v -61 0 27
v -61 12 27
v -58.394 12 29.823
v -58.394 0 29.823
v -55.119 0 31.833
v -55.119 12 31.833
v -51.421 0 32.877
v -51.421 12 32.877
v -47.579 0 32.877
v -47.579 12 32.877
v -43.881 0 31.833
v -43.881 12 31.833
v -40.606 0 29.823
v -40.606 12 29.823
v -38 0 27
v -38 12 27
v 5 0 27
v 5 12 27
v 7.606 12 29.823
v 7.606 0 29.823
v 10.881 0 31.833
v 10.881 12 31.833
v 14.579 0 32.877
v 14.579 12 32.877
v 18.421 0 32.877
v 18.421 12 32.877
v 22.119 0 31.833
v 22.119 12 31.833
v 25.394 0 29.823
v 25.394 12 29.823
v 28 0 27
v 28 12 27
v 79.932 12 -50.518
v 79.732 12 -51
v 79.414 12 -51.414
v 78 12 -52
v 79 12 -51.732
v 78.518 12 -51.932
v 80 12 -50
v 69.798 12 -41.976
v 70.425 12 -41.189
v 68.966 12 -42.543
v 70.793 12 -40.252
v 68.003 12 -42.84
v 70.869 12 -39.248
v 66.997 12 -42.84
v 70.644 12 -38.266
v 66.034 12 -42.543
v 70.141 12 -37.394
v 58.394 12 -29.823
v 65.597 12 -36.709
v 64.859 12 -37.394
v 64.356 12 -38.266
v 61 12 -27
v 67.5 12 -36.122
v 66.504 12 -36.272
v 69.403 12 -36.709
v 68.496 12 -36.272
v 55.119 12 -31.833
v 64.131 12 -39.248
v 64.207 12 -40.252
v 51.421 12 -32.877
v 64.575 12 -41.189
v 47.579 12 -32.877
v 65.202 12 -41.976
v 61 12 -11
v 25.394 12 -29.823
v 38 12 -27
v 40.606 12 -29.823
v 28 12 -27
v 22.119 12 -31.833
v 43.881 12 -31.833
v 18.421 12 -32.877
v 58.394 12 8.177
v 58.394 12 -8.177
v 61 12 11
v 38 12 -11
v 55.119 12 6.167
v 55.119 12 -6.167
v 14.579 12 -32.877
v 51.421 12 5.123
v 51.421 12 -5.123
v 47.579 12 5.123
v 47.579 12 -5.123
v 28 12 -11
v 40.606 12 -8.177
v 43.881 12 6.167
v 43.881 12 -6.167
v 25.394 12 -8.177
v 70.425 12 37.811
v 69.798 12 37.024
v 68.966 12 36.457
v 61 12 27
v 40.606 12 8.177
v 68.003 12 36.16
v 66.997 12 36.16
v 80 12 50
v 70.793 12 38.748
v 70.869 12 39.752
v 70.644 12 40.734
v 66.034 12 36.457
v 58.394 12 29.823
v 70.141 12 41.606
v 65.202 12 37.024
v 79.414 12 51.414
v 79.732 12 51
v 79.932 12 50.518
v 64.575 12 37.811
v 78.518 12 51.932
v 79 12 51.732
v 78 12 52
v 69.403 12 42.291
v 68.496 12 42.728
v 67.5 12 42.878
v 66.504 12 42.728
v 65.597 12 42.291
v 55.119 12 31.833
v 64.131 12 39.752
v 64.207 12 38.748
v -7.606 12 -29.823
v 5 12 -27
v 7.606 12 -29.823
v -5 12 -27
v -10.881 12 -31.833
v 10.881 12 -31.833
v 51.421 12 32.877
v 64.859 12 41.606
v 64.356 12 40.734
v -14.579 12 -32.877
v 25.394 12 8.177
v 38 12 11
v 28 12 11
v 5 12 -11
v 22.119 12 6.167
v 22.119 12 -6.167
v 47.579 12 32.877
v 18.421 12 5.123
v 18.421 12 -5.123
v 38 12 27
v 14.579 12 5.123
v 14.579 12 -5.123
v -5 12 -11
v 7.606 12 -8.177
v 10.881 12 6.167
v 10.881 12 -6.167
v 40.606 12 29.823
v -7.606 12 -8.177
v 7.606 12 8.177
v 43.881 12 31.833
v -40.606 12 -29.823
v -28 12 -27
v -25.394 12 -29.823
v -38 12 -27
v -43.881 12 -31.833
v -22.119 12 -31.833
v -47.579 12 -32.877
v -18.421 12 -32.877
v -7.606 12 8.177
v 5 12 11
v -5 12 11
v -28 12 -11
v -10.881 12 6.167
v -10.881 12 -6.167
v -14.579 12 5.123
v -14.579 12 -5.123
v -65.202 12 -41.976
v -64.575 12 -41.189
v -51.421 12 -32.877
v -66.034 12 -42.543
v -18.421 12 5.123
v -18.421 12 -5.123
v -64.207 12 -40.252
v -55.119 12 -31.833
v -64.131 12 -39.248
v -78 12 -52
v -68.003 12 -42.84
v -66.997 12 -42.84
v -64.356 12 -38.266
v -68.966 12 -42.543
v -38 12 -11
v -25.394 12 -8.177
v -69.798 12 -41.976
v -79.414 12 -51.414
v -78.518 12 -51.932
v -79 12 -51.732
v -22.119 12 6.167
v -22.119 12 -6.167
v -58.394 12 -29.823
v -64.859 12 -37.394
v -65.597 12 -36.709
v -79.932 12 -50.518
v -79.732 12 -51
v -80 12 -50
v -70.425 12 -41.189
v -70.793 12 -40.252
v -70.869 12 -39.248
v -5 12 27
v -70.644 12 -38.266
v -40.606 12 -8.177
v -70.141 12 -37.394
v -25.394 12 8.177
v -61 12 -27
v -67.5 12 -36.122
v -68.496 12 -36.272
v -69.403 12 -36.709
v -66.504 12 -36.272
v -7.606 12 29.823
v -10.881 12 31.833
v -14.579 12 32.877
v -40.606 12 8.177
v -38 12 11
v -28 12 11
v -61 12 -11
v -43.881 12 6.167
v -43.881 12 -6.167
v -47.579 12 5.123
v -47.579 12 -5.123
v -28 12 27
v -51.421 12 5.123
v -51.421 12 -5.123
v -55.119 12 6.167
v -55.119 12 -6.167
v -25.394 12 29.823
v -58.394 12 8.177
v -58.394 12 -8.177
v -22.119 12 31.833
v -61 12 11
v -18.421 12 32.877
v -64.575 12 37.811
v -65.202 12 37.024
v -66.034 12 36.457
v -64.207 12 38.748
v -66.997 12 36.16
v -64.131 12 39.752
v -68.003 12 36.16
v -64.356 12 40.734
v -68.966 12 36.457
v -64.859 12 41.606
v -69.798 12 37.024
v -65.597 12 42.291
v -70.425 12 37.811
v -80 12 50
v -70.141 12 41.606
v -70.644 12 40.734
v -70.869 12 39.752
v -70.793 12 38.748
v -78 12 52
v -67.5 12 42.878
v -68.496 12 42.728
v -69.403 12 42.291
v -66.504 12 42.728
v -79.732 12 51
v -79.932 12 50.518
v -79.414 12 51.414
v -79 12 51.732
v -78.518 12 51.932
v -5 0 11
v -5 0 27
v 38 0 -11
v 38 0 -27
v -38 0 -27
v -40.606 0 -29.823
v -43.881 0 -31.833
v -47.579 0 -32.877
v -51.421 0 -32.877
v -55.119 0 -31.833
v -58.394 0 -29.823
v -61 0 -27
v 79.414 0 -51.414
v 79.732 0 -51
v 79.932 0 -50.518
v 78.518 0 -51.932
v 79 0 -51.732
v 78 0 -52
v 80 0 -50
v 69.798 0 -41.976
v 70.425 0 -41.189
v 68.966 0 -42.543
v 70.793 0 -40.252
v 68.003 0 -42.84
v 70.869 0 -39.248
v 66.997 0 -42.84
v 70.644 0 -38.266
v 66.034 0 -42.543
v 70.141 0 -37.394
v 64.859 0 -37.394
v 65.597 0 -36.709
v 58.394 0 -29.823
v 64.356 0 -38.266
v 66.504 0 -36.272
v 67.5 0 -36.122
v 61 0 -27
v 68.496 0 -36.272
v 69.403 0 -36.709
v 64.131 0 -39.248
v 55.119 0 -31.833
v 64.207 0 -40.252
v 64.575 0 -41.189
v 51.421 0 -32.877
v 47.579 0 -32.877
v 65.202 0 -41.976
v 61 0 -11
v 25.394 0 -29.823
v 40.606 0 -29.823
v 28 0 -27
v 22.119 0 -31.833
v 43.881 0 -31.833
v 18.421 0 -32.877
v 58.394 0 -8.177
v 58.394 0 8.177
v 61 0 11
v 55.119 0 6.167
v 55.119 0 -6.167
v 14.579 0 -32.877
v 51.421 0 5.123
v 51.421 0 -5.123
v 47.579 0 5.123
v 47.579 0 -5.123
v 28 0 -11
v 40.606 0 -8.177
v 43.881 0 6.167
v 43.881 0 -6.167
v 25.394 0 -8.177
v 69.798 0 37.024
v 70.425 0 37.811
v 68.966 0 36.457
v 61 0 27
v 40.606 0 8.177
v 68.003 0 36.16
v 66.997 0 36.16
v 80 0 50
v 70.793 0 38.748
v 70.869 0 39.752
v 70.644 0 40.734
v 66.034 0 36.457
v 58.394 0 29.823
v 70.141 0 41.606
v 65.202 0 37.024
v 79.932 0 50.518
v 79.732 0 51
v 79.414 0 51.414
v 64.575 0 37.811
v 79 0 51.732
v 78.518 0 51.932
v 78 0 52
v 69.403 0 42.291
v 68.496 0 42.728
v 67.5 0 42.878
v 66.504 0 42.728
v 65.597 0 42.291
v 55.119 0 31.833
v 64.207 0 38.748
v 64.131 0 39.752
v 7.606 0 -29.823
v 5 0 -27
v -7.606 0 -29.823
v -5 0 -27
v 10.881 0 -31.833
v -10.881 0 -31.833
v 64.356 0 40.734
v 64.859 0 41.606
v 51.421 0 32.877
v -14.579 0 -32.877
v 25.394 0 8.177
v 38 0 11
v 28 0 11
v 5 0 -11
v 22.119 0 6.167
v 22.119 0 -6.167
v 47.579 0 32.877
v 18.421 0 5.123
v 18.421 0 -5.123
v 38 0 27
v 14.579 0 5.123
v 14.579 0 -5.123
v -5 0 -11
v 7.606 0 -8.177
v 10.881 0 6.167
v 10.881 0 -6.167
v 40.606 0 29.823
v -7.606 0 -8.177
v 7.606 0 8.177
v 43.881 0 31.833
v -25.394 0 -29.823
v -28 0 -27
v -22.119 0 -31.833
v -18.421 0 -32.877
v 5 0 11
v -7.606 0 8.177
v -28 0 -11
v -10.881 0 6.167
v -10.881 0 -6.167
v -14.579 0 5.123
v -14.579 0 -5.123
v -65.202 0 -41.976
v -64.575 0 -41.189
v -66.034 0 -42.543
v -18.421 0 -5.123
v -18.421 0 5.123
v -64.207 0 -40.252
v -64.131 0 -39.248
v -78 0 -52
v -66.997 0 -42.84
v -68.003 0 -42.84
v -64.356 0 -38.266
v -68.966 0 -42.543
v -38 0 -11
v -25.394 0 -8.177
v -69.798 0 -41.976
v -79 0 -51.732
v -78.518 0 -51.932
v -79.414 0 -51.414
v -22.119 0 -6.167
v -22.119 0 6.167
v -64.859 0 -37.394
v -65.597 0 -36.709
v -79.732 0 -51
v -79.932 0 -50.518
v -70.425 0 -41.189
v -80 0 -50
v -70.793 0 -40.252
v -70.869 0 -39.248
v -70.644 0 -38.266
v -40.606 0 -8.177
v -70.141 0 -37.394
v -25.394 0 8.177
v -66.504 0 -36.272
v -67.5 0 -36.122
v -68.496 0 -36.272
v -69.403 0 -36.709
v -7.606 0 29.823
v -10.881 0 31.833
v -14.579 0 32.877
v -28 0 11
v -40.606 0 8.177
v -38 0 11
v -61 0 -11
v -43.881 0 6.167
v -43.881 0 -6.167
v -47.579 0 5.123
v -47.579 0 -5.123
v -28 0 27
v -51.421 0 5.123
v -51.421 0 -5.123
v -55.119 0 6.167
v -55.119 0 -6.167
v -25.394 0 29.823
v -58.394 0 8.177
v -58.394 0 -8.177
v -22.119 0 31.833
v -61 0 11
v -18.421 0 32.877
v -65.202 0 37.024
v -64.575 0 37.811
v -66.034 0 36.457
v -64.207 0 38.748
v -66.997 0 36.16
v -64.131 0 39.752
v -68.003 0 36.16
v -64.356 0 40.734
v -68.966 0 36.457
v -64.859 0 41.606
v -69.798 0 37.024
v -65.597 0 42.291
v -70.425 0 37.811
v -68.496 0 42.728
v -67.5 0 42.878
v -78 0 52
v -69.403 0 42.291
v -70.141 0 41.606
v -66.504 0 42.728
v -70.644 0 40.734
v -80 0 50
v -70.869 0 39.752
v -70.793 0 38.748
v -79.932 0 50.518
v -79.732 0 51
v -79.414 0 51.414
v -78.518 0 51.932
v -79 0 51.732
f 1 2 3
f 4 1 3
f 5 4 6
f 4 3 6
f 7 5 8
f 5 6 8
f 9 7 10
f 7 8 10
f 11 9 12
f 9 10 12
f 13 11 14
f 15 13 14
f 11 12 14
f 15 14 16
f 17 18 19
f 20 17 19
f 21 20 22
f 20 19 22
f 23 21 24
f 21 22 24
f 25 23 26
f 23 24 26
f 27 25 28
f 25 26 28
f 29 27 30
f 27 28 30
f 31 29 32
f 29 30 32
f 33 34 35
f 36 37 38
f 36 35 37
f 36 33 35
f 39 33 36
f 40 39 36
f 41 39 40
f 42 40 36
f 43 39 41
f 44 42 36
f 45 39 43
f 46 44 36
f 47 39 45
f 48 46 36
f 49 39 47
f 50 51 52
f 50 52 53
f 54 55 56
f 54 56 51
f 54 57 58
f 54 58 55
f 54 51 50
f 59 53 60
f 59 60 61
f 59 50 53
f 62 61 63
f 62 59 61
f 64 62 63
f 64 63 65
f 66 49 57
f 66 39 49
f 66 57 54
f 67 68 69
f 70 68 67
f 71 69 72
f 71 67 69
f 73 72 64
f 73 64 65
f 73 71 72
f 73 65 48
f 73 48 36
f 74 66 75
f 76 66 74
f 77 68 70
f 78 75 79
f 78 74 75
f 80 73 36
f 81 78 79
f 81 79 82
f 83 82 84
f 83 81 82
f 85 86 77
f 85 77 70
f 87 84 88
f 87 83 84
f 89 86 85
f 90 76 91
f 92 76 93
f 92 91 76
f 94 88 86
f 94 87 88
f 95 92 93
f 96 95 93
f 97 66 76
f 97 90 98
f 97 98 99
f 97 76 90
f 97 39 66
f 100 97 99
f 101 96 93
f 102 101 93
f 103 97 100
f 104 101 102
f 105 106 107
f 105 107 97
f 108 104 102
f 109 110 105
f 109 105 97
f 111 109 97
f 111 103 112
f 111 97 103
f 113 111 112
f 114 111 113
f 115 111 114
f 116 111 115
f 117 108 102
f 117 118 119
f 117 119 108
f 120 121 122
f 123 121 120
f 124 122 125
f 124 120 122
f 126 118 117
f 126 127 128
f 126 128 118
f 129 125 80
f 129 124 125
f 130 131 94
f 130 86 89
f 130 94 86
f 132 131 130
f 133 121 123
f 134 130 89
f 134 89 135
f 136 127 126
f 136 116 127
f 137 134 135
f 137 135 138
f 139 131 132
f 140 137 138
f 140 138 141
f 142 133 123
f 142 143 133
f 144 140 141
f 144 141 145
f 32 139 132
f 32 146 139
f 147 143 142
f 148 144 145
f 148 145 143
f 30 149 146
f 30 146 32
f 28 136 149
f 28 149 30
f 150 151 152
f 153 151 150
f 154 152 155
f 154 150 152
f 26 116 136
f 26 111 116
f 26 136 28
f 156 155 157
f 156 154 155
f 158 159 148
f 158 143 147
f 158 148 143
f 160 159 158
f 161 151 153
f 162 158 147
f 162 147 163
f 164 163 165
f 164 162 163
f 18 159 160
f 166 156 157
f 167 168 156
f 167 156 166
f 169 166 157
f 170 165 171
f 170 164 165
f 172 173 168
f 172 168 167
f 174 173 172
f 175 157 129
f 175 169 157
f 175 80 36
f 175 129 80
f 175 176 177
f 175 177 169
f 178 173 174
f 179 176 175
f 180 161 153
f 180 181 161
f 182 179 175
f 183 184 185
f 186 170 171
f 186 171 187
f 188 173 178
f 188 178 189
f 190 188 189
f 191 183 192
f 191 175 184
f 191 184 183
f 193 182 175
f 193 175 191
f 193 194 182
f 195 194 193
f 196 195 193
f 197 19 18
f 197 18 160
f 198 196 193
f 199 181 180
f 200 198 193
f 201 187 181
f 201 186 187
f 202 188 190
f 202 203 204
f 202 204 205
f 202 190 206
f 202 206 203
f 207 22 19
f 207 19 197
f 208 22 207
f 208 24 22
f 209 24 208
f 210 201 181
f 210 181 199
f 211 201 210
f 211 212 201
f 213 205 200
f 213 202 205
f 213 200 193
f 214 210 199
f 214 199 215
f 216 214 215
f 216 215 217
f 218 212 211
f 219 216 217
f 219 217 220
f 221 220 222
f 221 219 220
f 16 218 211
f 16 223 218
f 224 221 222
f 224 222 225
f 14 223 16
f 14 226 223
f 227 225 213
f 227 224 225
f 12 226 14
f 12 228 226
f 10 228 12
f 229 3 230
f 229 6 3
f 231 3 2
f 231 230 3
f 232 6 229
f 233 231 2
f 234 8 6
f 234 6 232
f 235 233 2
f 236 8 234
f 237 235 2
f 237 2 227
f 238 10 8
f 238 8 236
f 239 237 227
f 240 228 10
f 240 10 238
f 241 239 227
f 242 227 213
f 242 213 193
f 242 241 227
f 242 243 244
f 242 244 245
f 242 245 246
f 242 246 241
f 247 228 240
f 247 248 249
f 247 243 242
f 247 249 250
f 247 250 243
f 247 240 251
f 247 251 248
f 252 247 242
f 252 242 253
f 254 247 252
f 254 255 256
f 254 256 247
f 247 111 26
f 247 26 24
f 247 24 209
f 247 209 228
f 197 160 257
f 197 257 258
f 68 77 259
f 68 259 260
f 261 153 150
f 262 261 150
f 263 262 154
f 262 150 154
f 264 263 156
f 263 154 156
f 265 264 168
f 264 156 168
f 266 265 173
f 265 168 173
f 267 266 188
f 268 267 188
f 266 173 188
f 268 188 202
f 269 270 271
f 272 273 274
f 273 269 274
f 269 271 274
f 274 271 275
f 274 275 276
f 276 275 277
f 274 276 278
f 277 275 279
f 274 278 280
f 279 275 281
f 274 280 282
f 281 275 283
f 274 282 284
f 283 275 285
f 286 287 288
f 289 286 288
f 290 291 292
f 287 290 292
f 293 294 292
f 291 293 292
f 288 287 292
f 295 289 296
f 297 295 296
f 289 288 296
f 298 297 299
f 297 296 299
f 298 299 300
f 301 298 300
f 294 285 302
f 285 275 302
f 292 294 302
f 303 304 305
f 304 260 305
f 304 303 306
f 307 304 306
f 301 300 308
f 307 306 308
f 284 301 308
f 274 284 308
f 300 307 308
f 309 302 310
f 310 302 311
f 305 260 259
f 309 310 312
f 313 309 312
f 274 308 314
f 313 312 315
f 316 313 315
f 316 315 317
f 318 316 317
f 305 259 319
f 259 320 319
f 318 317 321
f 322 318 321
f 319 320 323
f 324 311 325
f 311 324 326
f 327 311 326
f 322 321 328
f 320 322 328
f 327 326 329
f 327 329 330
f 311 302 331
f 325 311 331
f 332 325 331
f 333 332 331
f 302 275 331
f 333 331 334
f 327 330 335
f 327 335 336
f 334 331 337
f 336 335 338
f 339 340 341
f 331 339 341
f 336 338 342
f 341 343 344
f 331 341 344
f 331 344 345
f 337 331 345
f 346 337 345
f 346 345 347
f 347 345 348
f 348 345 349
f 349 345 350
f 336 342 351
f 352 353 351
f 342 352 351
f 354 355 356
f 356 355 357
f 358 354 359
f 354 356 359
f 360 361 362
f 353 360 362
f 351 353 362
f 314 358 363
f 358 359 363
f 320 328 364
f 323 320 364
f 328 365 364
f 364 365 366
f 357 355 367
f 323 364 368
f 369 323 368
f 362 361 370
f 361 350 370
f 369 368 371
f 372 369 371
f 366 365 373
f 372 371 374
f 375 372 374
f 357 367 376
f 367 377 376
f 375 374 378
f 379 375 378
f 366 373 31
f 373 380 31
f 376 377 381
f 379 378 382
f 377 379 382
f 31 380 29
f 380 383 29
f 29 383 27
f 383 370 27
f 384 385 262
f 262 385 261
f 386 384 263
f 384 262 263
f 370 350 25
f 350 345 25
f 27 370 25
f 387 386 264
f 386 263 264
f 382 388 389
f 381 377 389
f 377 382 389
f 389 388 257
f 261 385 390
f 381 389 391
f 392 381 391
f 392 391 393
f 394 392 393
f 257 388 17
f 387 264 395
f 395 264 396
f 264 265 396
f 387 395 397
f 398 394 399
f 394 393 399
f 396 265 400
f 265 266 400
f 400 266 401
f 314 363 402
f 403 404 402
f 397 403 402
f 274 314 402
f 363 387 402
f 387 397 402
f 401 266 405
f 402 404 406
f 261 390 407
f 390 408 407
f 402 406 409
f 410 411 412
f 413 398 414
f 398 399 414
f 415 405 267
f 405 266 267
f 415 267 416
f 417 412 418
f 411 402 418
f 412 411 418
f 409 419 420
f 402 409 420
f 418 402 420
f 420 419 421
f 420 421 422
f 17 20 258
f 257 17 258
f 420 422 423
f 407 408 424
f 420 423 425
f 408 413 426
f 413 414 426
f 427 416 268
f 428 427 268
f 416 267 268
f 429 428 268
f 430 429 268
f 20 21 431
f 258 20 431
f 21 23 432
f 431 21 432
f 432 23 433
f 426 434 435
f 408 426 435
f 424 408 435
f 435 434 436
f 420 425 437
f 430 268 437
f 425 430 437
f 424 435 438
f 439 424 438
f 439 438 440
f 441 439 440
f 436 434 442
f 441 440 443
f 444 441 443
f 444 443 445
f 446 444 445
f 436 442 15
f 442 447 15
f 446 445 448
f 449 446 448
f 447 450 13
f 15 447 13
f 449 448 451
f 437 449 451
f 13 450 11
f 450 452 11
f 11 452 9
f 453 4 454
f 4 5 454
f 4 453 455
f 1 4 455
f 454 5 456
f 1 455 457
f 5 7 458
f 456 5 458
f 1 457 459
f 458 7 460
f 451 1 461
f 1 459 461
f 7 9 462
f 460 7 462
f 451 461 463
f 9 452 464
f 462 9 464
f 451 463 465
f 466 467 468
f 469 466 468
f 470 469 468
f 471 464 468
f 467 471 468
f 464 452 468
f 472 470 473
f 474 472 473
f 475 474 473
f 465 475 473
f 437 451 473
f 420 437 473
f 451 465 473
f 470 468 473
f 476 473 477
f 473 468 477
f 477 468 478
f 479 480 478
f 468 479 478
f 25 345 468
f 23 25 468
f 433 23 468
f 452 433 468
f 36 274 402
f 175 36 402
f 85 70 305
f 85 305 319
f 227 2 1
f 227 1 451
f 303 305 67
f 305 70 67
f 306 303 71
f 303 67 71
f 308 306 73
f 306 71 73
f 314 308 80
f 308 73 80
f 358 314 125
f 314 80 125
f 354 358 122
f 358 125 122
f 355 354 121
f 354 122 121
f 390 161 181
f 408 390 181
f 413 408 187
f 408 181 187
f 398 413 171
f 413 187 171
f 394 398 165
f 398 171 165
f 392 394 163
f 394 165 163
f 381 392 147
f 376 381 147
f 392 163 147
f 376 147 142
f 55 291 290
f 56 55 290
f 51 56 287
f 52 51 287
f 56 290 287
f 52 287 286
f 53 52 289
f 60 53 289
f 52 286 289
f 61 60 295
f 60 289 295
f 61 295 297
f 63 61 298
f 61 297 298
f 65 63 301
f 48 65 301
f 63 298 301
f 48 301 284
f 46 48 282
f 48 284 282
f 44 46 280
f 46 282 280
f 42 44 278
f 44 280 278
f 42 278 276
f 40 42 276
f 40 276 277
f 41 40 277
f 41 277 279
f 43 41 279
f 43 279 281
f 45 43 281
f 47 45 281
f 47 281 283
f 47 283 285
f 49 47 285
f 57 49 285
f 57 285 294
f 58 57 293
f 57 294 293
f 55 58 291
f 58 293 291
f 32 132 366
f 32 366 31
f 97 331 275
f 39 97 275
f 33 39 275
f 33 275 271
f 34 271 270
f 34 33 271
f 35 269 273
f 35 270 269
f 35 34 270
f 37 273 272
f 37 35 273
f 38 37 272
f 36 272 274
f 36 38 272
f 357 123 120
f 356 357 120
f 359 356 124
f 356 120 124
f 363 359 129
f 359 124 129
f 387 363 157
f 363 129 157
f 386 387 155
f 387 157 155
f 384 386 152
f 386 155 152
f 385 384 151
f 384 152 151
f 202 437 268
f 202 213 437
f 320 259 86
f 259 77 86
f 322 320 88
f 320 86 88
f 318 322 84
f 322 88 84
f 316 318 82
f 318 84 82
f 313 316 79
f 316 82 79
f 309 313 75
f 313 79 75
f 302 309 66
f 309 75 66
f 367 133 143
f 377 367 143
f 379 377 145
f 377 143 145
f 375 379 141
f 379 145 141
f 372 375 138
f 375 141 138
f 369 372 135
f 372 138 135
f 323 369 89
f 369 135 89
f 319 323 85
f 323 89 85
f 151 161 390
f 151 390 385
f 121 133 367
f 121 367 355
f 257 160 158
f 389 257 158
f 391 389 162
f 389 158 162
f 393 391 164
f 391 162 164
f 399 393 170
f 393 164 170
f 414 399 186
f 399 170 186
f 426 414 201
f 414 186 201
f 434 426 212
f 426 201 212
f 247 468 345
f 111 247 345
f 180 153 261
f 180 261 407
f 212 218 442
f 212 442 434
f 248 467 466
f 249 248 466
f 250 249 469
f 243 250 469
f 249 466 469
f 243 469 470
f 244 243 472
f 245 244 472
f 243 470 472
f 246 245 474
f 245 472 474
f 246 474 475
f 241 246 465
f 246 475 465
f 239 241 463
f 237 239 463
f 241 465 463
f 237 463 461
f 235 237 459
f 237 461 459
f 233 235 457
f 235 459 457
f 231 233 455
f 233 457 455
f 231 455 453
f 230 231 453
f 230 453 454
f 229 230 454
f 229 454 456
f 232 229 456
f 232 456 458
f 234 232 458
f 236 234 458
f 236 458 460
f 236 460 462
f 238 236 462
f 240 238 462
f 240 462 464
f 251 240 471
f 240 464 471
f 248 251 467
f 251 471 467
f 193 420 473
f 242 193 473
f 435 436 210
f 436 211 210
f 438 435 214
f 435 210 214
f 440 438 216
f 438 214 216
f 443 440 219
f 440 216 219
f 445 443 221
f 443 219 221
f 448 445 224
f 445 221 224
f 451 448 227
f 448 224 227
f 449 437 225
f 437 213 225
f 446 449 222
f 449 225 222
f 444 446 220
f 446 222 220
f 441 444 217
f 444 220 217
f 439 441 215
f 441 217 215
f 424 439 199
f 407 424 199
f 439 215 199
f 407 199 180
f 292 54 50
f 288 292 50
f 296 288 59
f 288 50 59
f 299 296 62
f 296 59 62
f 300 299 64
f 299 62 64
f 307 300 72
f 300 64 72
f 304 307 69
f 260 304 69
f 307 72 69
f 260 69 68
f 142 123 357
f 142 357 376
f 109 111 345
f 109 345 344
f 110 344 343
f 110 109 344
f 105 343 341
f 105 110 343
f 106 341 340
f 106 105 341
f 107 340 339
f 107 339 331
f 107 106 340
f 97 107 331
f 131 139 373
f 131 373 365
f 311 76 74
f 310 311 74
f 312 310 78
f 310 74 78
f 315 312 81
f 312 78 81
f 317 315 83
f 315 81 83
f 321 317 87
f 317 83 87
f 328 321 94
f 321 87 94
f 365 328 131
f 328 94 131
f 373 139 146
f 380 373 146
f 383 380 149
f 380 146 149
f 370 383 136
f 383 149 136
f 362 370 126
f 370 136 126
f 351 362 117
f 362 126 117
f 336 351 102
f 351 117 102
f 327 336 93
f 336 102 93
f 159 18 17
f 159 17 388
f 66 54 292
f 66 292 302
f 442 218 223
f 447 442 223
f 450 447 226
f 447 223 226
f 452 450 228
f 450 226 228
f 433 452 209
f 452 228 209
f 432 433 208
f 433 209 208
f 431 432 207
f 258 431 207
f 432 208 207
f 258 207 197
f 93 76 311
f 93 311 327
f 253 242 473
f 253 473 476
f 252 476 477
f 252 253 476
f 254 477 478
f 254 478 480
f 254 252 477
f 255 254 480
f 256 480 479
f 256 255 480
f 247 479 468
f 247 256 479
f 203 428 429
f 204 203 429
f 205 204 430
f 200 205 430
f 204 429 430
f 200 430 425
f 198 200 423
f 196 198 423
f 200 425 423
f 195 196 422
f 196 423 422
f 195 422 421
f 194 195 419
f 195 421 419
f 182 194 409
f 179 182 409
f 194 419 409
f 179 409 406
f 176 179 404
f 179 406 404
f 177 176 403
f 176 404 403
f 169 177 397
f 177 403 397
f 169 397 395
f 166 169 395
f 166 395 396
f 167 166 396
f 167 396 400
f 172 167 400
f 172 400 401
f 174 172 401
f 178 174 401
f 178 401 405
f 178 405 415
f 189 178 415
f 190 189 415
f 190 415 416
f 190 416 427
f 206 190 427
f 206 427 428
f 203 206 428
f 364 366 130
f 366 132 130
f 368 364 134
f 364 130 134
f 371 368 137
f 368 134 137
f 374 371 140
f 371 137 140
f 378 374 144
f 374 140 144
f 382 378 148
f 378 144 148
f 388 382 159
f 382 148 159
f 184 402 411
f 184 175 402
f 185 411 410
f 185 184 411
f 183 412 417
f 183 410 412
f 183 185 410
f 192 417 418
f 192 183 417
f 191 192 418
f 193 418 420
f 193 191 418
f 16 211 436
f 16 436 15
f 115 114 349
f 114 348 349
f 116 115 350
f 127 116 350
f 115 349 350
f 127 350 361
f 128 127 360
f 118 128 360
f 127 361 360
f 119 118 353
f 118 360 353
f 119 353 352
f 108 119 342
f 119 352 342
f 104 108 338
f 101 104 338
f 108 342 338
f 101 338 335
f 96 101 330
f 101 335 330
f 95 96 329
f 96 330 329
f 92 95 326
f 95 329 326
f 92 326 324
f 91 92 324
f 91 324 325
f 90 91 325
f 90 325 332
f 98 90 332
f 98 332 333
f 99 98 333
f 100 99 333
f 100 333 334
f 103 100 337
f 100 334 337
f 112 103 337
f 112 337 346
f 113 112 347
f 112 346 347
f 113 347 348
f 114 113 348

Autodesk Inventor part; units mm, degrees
ref_plane "YZ Plane" through (0, 0, 0) normal (1, 0, 0) x (0, 1, 0)
ref_plane "XZ Plane" through (0, 0, 0) normal (0, 1, 0) x (-1, 0, 0)
ref_plane "XY Plane" through (0, 0, 0) normal (0, 0, 1) x (1, 0, 0)
sketch "Sketch1" plane through (0, 0, 0) normal (0, 1, 0) x (-1, 0, 0)
  line L0 (80, 52) -> (-80, 52)
  line L1 (-80, 52) -> (-80, -52)
  line L2 (-80, -52) -> (80, -52)
  line L3 (80, -52) -> (80, 52)
  line L4 (80, 52) -> (-80, -52) construction
  line L5 (-80, 52) -> (80, -52) construction
  point P0 (0, 0)
  dimension "d0" = 160
  dimension "d1" = 104
extrude "Extrusion1" add sketch "Sketch1" along normal blind 12
sketch "Sketch2" plane through (0, 12, 0) normal (0, 1, 0) x (1, 0, 0)
  line L0 (-38, 27) -> (-38, 11)
  line L1 (-61, 11) -> (-61, 27)
  line L2 (-80, 52) -> (-80, -52) projected
  line L3 (80, 52) -> (-80, 52) projected
  arc A0 (-38, 27) -> (-61, 27) centre (-49.5, 19) ccw
  arc A1 (-61, 11) -> (-38, 11) centre (-49.5, 19) ccw
  point P0 (0, 0)
  dimension "d4" = 23
  dimension "d5" = 16
  dimension "d6" = 19
  dimension "d8" = 33
extrude "Extrusion2" cut sketch "Sketch2" against normal up to next
pattern_linear "Rectangular Pattern1" count 4 spacing -33 along (-1, 0, 0) count 2 spacing 38 along (0, 0, 1) of "Extrusion2"
sketch "Sketch4" plane through (0, 12, 0) normal (0, 1, 0) x (1, 0, 0)
  line L0 (-80, 52) -> (-80, -52) projected
  line L1 (80, 52) -> (-80, 52) projected
  line L2 (80, -52) -> (80, 52) projected
  line L3 (-80, -52) -> (80, -52) projected
  point P0 (0, 0)
  point P1 (-67.5, 39.5)
  point P2 (67.5, 39.5)
  point P3 (67.5, -39.5)
  point P4 (-67.5, -39.5)
  dimension "d24" = 12.5
  dimension "d25" = 12.5
  dimension "d26" = 12.5
  dimension "d27" = 12.5
  dimension "d28" = 12.5
  dimension "d29" = 12.5
  dimension "d30" = 12.5
  dimension "d31" = 12.5
hole "Hole1" at (-67.5, 12, -39.5) at (67.5, 12, -39.5) at (67.5, 12, 39.5) at (-67.5, 12, 39.5) direction (0, -1, 0) diameter 6.756 depth 25.4 clearance for "Socket Head Cap Screw" size "1/4" standard "Ansi Unified Screw Threads"
fillet "Fillet1" radius 2 4 edges at (-80, 6, 52) (80, 6, 52) (80, 6, -52) (-80, 6, -52)
properties part number "4_OM_VialPlate"
